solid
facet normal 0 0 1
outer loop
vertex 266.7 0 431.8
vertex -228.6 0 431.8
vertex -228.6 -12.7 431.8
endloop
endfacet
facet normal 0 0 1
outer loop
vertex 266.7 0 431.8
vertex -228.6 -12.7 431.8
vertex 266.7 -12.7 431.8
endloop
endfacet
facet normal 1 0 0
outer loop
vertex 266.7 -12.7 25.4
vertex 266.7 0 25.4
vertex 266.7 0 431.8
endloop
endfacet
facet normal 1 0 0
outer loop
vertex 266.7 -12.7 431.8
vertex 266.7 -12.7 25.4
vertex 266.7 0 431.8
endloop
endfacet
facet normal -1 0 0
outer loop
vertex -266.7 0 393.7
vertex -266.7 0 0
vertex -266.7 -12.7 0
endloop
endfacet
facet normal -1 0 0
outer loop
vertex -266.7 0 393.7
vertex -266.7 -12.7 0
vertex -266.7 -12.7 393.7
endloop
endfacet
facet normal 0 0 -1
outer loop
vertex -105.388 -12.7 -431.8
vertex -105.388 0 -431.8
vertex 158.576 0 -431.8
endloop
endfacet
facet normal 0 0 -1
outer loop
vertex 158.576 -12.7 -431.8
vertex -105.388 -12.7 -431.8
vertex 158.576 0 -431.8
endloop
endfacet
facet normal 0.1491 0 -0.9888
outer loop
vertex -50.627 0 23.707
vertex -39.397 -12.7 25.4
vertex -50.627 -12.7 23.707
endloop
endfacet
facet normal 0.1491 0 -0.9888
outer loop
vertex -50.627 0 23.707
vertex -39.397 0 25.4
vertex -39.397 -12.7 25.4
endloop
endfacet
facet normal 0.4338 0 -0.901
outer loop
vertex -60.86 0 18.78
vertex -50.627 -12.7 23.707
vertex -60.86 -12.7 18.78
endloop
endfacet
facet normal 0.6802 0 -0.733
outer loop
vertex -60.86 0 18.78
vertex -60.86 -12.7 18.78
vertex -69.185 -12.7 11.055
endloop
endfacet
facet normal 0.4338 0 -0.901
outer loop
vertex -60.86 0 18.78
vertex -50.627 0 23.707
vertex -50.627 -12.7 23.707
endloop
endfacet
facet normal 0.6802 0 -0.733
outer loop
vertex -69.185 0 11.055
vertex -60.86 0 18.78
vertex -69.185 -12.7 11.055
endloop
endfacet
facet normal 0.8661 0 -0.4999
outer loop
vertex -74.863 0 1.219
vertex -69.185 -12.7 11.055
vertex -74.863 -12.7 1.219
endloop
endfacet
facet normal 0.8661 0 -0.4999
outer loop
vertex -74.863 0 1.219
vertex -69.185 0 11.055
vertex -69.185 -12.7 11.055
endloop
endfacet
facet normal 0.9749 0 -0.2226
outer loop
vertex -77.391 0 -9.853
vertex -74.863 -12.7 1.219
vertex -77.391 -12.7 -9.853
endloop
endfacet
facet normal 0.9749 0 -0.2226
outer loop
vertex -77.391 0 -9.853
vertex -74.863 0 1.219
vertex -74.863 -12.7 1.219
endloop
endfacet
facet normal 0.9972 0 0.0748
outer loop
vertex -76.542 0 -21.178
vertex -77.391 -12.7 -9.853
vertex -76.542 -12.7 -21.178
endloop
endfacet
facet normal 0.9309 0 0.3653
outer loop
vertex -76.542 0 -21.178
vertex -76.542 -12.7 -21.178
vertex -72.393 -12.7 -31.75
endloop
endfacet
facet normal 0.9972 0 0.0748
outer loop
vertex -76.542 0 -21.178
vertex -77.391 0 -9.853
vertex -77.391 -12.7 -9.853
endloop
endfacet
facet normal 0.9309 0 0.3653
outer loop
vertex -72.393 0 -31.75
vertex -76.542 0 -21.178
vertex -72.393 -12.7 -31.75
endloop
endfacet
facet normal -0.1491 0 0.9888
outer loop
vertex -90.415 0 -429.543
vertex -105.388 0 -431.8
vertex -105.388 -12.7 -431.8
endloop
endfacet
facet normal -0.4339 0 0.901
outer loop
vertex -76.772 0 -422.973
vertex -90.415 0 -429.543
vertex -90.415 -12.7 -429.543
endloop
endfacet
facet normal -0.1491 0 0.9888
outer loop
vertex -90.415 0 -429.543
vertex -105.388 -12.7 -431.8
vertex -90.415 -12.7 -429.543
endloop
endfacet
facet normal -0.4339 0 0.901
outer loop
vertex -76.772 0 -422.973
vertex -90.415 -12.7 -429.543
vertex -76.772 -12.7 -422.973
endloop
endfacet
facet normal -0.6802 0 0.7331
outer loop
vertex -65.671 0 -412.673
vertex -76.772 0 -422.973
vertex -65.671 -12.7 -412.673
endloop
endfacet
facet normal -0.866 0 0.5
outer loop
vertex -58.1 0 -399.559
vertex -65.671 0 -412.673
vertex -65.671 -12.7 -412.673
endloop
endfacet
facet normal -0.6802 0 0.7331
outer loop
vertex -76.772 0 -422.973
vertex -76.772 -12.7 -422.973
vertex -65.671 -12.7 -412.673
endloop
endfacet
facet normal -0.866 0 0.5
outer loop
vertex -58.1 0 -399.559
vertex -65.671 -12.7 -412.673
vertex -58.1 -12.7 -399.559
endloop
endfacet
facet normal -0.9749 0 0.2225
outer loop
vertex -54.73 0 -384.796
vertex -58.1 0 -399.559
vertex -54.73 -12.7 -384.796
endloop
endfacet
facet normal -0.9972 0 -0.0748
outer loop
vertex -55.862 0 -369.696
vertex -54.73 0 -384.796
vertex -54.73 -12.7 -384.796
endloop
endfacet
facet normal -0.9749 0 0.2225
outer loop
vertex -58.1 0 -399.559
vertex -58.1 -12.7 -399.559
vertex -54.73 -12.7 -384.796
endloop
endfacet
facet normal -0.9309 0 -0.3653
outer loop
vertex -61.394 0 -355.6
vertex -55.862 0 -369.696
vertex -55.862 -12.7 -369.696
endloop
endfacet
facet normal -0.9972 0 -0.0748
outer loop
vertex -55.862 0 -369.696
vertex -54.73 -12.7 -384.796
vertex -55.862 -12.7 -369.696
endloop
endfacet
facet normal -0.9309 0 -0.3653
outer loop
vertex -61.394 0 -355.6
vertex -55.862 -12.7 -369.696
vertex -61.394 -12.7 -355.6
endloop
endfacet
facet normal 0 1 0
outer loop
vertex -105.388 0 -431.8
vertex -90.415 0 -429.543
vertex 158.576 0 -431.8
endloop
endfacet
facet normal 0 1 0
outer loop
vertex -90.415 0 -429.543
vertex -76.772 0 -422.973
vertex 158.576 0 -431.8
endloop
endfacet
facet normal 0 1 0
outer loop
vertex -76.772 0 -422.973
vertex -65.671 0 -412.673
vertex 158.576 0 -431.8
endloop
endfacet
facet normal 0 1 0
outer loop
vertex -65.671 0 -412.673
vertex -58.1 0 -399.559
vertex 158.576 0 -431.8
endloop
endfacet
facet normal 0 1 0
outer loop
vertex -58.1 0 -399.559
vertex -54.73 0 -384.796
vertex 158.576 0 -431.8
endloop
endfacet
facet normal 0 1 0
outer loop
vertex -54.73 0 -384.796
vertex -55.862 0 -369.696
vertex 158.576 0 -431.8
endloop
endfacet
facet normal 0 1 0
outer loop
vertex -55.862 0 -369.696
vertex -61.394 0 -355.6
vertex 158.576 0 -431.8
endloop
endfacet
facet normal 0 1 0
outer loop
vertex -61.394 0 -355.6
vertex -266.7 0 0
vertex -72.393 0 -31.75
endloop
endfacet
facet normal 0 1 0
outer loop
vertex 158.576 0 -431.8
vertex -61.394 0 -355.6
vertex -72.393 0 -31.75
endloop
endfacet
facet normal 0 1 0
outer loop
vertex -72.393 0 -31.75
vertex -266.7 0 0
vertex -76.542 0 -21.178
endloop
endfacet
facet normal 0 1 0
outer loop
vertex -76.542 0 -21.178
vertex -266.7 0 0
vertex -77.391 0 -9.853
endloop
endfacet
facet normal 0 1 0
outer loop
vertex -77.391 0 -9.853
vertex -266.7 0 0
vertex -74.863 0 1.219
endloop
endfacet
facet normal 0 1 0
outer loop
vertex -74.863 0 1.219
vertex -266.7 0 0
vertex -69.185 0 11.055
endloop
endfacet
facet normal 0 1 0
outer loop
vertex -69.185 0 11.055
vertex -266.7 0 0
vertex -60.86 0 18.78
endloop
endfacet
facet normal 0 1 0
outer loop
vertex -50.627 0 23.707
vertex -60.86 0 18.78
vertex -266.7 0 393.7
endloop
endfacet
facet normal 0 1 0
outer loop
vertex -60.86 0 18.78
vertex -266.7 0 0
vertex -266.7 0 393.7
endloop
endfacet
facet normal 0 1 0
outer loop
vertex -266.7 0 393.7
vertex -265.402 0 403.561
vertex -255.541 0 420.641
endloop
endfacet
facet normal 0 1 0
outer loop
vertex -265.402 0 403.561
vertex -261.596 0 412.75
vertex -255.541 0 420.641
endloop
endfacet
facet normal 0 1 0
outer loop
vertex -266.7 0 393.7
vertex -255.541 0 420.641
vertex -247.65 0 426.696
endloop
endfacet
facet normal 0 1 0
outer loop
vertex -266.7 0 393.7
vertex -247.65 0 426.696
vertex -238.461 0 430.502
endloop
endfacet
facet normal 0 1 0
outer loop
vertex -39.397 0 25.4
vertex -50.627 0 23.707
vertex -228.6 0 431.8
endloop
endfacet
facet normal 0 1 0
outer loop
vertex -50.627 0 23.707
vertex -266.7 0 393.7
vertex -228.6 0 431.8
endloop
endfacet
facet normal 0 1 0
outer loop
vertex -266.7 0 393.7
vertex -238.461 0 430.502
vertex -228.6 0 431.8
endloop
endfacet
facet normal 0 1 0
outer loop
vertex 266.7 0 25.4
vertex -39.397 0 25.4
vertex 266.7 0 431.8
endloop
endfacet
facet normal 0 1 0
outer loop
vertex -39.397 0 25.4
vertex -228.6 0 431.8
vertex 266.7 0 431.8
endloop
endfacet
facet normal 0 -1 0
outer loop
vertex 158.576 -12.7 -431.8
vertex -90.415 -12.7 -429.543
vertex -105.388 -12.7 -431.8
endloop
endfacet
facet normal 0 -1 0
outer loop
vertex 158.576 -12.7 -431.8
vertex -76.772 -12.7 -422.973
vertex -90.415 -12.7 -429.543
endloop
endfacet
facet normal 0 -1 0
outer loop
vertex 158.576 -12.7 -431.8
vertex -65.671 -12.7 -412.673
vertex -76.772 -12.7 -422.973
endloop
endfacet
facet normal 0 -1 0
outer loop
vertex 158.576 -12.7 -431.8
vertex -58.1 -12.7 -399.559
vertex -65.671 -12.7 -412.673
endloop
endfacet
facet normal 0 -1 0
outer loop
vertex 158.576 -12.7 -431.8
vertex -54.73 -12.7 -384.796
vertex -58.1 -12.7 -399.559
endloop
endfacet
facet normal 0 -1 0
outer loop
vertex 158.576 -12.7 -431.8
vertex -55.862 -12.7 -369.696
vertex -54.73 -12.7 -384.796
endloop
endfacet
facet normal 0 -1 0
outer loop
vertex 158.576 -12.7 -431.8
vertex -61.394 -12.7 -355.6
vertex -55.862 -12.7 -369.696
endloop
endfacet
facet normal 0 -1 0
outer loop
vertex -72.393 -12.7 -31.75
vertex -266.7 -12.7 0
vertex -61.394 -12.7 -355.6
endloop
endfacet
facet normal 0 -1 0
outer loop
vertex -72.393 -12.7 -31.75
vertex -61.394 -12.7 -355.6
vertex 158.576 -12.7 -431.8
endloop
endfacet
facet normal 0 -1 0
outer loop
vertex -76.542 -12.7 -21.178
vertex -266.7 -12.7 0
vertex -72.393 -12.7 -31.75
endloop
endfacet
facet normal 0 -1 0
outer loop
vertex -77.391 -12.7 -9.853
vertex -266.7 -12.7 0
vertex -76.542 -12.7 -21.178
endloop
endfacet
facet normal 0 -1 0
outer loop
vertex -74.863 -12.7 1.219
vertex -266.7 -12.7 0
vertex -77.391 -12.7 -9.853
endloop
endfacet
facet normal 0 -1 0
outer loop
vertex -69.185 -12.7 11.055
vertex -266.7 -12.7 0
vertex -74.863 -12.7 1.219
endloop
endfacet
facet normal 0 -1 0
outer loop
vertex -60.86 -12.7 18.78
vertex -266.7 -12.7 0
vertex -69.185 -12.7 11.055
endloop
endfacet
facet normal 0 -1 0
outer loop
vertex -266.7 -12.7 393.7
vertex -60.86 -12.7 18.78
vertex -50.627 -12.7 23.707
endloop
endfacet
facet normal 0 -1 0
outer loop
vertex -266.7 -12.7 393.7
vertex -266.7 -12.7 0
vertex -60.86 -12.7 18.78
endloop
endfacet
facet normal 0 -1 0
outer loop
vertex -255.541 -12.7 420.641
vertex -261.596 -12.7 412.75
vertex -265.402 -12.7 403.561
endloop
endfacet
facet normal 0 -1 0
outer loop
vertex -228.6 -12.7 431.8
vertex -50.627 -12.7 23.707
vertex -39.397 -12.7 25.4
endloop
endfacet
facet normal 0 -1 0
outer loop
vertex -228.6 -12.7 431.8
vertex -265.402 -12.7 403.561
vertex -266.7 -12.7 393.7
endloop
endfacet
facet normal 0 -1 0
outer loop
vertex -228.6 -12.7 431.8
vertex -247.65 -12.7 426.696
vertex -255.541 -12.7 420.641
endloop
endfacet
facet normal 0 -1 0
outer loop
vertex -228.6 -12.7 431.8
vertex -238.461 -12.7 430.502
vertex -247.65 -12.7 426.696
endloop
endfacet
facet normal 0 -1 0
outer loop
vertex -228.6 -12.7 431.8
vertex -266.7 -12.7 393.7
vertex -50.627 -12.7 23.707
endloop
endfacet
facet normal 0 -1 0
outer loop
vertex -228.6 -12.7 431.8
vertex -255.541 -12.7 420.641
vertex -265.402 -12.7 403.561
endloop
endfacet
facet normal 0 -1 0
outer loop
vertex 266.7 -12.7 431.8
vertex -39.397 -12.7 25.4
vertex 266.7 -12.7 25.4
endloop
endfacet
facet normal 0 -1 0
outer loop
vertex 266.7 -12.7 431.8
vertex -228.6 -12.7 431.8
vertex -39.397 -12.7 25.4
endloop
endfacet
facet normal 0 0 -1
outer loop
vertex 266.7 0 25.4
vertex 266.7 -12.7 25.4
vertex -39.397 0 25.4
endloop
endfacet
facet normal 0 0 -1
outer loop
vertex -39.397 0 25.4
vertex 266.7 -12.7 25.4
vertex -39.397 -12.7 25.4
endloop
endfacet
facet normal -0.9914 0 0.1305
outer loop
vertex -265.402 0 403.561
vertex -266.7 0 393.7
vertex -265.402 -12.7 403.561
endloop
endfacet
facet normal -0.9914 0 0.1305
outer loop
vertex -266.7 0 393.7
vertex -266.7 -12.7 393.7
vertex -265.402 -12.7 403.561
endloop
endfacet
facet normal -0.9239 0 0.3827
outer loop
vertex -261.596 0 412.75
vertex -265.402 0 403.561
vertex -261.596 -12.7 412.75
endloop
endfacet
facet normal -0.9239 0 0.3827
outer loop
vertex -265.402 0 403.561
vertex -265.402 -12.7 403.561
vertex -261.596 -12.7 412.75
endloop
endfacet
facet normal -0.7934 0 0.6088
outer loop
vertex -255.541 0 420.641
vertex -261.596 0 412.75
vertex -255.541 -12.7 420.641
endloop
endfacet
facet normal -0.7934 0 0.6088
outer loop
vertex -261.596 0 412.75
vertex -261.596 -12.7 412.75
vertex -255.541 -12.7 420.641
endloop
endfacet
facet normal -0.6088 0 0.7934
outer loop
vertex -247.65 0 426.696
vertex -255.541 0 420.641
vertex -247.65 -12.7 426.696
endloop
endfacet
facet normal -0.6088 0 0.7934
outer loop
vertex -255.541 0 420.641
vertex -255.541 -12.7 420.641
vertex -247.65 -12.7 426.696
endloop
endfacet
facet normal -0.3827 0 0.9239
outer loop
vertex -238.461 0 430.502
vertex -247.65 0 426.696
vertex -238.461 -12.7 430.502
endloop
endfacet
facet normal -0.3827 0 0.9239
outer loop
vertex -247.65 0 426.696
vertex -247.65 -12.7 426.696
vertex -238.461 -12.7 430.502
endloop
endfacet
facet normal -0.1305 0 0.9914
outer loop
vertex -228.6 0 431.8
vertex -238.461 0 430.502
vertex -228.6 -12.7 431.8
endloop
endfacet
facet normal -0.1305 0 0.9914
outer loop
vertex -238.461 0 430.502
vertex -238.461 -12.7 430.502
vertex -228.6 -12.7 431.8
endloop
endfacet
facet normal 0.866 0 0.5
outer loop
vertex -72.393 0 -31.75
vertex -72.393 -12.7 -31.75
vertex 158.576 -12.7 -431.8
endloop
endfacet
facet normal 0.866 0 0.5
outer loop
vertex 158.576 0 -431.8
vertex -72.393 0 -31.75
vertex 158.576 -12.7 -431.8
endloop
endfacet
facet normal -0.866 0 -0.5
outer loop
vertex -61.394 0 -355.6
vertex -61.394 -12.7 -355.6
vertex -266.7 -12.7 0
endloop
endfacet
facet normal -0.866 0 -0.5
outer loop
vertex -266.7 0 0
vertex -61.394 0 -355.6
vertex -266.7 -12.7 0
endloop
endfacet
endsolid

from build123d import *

# Parameters (mm, degrees)
F0_W     = 533.4
F0_H     = 863.6
F1_DEPTH = 12.7
F3_DEPTH = 12.701
F4_R     = 38.1


with BuildPart() as f1:
    # F0 (on Front) → F1 (new body)
    with BuildSketch(Plane.XZ):
        Rectangle(F0_W, F0_H)
    extrude(amount=F1_DEPTH)

    # F2 (on face) → F3 (cut, through all)
    with BuildSketch(Plane.XZ.offset(12.7)):
        with BuildLine():
            Line((-61.394244, -355.6), (-266.7, 0))
            Line((-266.7, 0), (-266.7, -431.8))
            Line((-266.7, -431.8), (-105.388335, -431.8))
            ThreePointArc((-105.388335, -431.8), (-61.394244, -406.4), (-61.394244, -355.6))
        make_face()
        Polygon((-105.388335, 25.4), (158.576208, -431.8), (266.7, -431.8), (266.7, 25.4), align=None)
    extrude(amount=-F3_DEPTH, mode=Mode.SUBTRACT)

    # F4
    f4_edges = [f1.edges().sort_by_distance(p)[0] for p in [
        (-266.7, -6.35, 431.8),
        (-105.388335, -6.35, 25.4),
    ]]
    fillet(f4_edges, radius=F4_R)


solid = f1.part
